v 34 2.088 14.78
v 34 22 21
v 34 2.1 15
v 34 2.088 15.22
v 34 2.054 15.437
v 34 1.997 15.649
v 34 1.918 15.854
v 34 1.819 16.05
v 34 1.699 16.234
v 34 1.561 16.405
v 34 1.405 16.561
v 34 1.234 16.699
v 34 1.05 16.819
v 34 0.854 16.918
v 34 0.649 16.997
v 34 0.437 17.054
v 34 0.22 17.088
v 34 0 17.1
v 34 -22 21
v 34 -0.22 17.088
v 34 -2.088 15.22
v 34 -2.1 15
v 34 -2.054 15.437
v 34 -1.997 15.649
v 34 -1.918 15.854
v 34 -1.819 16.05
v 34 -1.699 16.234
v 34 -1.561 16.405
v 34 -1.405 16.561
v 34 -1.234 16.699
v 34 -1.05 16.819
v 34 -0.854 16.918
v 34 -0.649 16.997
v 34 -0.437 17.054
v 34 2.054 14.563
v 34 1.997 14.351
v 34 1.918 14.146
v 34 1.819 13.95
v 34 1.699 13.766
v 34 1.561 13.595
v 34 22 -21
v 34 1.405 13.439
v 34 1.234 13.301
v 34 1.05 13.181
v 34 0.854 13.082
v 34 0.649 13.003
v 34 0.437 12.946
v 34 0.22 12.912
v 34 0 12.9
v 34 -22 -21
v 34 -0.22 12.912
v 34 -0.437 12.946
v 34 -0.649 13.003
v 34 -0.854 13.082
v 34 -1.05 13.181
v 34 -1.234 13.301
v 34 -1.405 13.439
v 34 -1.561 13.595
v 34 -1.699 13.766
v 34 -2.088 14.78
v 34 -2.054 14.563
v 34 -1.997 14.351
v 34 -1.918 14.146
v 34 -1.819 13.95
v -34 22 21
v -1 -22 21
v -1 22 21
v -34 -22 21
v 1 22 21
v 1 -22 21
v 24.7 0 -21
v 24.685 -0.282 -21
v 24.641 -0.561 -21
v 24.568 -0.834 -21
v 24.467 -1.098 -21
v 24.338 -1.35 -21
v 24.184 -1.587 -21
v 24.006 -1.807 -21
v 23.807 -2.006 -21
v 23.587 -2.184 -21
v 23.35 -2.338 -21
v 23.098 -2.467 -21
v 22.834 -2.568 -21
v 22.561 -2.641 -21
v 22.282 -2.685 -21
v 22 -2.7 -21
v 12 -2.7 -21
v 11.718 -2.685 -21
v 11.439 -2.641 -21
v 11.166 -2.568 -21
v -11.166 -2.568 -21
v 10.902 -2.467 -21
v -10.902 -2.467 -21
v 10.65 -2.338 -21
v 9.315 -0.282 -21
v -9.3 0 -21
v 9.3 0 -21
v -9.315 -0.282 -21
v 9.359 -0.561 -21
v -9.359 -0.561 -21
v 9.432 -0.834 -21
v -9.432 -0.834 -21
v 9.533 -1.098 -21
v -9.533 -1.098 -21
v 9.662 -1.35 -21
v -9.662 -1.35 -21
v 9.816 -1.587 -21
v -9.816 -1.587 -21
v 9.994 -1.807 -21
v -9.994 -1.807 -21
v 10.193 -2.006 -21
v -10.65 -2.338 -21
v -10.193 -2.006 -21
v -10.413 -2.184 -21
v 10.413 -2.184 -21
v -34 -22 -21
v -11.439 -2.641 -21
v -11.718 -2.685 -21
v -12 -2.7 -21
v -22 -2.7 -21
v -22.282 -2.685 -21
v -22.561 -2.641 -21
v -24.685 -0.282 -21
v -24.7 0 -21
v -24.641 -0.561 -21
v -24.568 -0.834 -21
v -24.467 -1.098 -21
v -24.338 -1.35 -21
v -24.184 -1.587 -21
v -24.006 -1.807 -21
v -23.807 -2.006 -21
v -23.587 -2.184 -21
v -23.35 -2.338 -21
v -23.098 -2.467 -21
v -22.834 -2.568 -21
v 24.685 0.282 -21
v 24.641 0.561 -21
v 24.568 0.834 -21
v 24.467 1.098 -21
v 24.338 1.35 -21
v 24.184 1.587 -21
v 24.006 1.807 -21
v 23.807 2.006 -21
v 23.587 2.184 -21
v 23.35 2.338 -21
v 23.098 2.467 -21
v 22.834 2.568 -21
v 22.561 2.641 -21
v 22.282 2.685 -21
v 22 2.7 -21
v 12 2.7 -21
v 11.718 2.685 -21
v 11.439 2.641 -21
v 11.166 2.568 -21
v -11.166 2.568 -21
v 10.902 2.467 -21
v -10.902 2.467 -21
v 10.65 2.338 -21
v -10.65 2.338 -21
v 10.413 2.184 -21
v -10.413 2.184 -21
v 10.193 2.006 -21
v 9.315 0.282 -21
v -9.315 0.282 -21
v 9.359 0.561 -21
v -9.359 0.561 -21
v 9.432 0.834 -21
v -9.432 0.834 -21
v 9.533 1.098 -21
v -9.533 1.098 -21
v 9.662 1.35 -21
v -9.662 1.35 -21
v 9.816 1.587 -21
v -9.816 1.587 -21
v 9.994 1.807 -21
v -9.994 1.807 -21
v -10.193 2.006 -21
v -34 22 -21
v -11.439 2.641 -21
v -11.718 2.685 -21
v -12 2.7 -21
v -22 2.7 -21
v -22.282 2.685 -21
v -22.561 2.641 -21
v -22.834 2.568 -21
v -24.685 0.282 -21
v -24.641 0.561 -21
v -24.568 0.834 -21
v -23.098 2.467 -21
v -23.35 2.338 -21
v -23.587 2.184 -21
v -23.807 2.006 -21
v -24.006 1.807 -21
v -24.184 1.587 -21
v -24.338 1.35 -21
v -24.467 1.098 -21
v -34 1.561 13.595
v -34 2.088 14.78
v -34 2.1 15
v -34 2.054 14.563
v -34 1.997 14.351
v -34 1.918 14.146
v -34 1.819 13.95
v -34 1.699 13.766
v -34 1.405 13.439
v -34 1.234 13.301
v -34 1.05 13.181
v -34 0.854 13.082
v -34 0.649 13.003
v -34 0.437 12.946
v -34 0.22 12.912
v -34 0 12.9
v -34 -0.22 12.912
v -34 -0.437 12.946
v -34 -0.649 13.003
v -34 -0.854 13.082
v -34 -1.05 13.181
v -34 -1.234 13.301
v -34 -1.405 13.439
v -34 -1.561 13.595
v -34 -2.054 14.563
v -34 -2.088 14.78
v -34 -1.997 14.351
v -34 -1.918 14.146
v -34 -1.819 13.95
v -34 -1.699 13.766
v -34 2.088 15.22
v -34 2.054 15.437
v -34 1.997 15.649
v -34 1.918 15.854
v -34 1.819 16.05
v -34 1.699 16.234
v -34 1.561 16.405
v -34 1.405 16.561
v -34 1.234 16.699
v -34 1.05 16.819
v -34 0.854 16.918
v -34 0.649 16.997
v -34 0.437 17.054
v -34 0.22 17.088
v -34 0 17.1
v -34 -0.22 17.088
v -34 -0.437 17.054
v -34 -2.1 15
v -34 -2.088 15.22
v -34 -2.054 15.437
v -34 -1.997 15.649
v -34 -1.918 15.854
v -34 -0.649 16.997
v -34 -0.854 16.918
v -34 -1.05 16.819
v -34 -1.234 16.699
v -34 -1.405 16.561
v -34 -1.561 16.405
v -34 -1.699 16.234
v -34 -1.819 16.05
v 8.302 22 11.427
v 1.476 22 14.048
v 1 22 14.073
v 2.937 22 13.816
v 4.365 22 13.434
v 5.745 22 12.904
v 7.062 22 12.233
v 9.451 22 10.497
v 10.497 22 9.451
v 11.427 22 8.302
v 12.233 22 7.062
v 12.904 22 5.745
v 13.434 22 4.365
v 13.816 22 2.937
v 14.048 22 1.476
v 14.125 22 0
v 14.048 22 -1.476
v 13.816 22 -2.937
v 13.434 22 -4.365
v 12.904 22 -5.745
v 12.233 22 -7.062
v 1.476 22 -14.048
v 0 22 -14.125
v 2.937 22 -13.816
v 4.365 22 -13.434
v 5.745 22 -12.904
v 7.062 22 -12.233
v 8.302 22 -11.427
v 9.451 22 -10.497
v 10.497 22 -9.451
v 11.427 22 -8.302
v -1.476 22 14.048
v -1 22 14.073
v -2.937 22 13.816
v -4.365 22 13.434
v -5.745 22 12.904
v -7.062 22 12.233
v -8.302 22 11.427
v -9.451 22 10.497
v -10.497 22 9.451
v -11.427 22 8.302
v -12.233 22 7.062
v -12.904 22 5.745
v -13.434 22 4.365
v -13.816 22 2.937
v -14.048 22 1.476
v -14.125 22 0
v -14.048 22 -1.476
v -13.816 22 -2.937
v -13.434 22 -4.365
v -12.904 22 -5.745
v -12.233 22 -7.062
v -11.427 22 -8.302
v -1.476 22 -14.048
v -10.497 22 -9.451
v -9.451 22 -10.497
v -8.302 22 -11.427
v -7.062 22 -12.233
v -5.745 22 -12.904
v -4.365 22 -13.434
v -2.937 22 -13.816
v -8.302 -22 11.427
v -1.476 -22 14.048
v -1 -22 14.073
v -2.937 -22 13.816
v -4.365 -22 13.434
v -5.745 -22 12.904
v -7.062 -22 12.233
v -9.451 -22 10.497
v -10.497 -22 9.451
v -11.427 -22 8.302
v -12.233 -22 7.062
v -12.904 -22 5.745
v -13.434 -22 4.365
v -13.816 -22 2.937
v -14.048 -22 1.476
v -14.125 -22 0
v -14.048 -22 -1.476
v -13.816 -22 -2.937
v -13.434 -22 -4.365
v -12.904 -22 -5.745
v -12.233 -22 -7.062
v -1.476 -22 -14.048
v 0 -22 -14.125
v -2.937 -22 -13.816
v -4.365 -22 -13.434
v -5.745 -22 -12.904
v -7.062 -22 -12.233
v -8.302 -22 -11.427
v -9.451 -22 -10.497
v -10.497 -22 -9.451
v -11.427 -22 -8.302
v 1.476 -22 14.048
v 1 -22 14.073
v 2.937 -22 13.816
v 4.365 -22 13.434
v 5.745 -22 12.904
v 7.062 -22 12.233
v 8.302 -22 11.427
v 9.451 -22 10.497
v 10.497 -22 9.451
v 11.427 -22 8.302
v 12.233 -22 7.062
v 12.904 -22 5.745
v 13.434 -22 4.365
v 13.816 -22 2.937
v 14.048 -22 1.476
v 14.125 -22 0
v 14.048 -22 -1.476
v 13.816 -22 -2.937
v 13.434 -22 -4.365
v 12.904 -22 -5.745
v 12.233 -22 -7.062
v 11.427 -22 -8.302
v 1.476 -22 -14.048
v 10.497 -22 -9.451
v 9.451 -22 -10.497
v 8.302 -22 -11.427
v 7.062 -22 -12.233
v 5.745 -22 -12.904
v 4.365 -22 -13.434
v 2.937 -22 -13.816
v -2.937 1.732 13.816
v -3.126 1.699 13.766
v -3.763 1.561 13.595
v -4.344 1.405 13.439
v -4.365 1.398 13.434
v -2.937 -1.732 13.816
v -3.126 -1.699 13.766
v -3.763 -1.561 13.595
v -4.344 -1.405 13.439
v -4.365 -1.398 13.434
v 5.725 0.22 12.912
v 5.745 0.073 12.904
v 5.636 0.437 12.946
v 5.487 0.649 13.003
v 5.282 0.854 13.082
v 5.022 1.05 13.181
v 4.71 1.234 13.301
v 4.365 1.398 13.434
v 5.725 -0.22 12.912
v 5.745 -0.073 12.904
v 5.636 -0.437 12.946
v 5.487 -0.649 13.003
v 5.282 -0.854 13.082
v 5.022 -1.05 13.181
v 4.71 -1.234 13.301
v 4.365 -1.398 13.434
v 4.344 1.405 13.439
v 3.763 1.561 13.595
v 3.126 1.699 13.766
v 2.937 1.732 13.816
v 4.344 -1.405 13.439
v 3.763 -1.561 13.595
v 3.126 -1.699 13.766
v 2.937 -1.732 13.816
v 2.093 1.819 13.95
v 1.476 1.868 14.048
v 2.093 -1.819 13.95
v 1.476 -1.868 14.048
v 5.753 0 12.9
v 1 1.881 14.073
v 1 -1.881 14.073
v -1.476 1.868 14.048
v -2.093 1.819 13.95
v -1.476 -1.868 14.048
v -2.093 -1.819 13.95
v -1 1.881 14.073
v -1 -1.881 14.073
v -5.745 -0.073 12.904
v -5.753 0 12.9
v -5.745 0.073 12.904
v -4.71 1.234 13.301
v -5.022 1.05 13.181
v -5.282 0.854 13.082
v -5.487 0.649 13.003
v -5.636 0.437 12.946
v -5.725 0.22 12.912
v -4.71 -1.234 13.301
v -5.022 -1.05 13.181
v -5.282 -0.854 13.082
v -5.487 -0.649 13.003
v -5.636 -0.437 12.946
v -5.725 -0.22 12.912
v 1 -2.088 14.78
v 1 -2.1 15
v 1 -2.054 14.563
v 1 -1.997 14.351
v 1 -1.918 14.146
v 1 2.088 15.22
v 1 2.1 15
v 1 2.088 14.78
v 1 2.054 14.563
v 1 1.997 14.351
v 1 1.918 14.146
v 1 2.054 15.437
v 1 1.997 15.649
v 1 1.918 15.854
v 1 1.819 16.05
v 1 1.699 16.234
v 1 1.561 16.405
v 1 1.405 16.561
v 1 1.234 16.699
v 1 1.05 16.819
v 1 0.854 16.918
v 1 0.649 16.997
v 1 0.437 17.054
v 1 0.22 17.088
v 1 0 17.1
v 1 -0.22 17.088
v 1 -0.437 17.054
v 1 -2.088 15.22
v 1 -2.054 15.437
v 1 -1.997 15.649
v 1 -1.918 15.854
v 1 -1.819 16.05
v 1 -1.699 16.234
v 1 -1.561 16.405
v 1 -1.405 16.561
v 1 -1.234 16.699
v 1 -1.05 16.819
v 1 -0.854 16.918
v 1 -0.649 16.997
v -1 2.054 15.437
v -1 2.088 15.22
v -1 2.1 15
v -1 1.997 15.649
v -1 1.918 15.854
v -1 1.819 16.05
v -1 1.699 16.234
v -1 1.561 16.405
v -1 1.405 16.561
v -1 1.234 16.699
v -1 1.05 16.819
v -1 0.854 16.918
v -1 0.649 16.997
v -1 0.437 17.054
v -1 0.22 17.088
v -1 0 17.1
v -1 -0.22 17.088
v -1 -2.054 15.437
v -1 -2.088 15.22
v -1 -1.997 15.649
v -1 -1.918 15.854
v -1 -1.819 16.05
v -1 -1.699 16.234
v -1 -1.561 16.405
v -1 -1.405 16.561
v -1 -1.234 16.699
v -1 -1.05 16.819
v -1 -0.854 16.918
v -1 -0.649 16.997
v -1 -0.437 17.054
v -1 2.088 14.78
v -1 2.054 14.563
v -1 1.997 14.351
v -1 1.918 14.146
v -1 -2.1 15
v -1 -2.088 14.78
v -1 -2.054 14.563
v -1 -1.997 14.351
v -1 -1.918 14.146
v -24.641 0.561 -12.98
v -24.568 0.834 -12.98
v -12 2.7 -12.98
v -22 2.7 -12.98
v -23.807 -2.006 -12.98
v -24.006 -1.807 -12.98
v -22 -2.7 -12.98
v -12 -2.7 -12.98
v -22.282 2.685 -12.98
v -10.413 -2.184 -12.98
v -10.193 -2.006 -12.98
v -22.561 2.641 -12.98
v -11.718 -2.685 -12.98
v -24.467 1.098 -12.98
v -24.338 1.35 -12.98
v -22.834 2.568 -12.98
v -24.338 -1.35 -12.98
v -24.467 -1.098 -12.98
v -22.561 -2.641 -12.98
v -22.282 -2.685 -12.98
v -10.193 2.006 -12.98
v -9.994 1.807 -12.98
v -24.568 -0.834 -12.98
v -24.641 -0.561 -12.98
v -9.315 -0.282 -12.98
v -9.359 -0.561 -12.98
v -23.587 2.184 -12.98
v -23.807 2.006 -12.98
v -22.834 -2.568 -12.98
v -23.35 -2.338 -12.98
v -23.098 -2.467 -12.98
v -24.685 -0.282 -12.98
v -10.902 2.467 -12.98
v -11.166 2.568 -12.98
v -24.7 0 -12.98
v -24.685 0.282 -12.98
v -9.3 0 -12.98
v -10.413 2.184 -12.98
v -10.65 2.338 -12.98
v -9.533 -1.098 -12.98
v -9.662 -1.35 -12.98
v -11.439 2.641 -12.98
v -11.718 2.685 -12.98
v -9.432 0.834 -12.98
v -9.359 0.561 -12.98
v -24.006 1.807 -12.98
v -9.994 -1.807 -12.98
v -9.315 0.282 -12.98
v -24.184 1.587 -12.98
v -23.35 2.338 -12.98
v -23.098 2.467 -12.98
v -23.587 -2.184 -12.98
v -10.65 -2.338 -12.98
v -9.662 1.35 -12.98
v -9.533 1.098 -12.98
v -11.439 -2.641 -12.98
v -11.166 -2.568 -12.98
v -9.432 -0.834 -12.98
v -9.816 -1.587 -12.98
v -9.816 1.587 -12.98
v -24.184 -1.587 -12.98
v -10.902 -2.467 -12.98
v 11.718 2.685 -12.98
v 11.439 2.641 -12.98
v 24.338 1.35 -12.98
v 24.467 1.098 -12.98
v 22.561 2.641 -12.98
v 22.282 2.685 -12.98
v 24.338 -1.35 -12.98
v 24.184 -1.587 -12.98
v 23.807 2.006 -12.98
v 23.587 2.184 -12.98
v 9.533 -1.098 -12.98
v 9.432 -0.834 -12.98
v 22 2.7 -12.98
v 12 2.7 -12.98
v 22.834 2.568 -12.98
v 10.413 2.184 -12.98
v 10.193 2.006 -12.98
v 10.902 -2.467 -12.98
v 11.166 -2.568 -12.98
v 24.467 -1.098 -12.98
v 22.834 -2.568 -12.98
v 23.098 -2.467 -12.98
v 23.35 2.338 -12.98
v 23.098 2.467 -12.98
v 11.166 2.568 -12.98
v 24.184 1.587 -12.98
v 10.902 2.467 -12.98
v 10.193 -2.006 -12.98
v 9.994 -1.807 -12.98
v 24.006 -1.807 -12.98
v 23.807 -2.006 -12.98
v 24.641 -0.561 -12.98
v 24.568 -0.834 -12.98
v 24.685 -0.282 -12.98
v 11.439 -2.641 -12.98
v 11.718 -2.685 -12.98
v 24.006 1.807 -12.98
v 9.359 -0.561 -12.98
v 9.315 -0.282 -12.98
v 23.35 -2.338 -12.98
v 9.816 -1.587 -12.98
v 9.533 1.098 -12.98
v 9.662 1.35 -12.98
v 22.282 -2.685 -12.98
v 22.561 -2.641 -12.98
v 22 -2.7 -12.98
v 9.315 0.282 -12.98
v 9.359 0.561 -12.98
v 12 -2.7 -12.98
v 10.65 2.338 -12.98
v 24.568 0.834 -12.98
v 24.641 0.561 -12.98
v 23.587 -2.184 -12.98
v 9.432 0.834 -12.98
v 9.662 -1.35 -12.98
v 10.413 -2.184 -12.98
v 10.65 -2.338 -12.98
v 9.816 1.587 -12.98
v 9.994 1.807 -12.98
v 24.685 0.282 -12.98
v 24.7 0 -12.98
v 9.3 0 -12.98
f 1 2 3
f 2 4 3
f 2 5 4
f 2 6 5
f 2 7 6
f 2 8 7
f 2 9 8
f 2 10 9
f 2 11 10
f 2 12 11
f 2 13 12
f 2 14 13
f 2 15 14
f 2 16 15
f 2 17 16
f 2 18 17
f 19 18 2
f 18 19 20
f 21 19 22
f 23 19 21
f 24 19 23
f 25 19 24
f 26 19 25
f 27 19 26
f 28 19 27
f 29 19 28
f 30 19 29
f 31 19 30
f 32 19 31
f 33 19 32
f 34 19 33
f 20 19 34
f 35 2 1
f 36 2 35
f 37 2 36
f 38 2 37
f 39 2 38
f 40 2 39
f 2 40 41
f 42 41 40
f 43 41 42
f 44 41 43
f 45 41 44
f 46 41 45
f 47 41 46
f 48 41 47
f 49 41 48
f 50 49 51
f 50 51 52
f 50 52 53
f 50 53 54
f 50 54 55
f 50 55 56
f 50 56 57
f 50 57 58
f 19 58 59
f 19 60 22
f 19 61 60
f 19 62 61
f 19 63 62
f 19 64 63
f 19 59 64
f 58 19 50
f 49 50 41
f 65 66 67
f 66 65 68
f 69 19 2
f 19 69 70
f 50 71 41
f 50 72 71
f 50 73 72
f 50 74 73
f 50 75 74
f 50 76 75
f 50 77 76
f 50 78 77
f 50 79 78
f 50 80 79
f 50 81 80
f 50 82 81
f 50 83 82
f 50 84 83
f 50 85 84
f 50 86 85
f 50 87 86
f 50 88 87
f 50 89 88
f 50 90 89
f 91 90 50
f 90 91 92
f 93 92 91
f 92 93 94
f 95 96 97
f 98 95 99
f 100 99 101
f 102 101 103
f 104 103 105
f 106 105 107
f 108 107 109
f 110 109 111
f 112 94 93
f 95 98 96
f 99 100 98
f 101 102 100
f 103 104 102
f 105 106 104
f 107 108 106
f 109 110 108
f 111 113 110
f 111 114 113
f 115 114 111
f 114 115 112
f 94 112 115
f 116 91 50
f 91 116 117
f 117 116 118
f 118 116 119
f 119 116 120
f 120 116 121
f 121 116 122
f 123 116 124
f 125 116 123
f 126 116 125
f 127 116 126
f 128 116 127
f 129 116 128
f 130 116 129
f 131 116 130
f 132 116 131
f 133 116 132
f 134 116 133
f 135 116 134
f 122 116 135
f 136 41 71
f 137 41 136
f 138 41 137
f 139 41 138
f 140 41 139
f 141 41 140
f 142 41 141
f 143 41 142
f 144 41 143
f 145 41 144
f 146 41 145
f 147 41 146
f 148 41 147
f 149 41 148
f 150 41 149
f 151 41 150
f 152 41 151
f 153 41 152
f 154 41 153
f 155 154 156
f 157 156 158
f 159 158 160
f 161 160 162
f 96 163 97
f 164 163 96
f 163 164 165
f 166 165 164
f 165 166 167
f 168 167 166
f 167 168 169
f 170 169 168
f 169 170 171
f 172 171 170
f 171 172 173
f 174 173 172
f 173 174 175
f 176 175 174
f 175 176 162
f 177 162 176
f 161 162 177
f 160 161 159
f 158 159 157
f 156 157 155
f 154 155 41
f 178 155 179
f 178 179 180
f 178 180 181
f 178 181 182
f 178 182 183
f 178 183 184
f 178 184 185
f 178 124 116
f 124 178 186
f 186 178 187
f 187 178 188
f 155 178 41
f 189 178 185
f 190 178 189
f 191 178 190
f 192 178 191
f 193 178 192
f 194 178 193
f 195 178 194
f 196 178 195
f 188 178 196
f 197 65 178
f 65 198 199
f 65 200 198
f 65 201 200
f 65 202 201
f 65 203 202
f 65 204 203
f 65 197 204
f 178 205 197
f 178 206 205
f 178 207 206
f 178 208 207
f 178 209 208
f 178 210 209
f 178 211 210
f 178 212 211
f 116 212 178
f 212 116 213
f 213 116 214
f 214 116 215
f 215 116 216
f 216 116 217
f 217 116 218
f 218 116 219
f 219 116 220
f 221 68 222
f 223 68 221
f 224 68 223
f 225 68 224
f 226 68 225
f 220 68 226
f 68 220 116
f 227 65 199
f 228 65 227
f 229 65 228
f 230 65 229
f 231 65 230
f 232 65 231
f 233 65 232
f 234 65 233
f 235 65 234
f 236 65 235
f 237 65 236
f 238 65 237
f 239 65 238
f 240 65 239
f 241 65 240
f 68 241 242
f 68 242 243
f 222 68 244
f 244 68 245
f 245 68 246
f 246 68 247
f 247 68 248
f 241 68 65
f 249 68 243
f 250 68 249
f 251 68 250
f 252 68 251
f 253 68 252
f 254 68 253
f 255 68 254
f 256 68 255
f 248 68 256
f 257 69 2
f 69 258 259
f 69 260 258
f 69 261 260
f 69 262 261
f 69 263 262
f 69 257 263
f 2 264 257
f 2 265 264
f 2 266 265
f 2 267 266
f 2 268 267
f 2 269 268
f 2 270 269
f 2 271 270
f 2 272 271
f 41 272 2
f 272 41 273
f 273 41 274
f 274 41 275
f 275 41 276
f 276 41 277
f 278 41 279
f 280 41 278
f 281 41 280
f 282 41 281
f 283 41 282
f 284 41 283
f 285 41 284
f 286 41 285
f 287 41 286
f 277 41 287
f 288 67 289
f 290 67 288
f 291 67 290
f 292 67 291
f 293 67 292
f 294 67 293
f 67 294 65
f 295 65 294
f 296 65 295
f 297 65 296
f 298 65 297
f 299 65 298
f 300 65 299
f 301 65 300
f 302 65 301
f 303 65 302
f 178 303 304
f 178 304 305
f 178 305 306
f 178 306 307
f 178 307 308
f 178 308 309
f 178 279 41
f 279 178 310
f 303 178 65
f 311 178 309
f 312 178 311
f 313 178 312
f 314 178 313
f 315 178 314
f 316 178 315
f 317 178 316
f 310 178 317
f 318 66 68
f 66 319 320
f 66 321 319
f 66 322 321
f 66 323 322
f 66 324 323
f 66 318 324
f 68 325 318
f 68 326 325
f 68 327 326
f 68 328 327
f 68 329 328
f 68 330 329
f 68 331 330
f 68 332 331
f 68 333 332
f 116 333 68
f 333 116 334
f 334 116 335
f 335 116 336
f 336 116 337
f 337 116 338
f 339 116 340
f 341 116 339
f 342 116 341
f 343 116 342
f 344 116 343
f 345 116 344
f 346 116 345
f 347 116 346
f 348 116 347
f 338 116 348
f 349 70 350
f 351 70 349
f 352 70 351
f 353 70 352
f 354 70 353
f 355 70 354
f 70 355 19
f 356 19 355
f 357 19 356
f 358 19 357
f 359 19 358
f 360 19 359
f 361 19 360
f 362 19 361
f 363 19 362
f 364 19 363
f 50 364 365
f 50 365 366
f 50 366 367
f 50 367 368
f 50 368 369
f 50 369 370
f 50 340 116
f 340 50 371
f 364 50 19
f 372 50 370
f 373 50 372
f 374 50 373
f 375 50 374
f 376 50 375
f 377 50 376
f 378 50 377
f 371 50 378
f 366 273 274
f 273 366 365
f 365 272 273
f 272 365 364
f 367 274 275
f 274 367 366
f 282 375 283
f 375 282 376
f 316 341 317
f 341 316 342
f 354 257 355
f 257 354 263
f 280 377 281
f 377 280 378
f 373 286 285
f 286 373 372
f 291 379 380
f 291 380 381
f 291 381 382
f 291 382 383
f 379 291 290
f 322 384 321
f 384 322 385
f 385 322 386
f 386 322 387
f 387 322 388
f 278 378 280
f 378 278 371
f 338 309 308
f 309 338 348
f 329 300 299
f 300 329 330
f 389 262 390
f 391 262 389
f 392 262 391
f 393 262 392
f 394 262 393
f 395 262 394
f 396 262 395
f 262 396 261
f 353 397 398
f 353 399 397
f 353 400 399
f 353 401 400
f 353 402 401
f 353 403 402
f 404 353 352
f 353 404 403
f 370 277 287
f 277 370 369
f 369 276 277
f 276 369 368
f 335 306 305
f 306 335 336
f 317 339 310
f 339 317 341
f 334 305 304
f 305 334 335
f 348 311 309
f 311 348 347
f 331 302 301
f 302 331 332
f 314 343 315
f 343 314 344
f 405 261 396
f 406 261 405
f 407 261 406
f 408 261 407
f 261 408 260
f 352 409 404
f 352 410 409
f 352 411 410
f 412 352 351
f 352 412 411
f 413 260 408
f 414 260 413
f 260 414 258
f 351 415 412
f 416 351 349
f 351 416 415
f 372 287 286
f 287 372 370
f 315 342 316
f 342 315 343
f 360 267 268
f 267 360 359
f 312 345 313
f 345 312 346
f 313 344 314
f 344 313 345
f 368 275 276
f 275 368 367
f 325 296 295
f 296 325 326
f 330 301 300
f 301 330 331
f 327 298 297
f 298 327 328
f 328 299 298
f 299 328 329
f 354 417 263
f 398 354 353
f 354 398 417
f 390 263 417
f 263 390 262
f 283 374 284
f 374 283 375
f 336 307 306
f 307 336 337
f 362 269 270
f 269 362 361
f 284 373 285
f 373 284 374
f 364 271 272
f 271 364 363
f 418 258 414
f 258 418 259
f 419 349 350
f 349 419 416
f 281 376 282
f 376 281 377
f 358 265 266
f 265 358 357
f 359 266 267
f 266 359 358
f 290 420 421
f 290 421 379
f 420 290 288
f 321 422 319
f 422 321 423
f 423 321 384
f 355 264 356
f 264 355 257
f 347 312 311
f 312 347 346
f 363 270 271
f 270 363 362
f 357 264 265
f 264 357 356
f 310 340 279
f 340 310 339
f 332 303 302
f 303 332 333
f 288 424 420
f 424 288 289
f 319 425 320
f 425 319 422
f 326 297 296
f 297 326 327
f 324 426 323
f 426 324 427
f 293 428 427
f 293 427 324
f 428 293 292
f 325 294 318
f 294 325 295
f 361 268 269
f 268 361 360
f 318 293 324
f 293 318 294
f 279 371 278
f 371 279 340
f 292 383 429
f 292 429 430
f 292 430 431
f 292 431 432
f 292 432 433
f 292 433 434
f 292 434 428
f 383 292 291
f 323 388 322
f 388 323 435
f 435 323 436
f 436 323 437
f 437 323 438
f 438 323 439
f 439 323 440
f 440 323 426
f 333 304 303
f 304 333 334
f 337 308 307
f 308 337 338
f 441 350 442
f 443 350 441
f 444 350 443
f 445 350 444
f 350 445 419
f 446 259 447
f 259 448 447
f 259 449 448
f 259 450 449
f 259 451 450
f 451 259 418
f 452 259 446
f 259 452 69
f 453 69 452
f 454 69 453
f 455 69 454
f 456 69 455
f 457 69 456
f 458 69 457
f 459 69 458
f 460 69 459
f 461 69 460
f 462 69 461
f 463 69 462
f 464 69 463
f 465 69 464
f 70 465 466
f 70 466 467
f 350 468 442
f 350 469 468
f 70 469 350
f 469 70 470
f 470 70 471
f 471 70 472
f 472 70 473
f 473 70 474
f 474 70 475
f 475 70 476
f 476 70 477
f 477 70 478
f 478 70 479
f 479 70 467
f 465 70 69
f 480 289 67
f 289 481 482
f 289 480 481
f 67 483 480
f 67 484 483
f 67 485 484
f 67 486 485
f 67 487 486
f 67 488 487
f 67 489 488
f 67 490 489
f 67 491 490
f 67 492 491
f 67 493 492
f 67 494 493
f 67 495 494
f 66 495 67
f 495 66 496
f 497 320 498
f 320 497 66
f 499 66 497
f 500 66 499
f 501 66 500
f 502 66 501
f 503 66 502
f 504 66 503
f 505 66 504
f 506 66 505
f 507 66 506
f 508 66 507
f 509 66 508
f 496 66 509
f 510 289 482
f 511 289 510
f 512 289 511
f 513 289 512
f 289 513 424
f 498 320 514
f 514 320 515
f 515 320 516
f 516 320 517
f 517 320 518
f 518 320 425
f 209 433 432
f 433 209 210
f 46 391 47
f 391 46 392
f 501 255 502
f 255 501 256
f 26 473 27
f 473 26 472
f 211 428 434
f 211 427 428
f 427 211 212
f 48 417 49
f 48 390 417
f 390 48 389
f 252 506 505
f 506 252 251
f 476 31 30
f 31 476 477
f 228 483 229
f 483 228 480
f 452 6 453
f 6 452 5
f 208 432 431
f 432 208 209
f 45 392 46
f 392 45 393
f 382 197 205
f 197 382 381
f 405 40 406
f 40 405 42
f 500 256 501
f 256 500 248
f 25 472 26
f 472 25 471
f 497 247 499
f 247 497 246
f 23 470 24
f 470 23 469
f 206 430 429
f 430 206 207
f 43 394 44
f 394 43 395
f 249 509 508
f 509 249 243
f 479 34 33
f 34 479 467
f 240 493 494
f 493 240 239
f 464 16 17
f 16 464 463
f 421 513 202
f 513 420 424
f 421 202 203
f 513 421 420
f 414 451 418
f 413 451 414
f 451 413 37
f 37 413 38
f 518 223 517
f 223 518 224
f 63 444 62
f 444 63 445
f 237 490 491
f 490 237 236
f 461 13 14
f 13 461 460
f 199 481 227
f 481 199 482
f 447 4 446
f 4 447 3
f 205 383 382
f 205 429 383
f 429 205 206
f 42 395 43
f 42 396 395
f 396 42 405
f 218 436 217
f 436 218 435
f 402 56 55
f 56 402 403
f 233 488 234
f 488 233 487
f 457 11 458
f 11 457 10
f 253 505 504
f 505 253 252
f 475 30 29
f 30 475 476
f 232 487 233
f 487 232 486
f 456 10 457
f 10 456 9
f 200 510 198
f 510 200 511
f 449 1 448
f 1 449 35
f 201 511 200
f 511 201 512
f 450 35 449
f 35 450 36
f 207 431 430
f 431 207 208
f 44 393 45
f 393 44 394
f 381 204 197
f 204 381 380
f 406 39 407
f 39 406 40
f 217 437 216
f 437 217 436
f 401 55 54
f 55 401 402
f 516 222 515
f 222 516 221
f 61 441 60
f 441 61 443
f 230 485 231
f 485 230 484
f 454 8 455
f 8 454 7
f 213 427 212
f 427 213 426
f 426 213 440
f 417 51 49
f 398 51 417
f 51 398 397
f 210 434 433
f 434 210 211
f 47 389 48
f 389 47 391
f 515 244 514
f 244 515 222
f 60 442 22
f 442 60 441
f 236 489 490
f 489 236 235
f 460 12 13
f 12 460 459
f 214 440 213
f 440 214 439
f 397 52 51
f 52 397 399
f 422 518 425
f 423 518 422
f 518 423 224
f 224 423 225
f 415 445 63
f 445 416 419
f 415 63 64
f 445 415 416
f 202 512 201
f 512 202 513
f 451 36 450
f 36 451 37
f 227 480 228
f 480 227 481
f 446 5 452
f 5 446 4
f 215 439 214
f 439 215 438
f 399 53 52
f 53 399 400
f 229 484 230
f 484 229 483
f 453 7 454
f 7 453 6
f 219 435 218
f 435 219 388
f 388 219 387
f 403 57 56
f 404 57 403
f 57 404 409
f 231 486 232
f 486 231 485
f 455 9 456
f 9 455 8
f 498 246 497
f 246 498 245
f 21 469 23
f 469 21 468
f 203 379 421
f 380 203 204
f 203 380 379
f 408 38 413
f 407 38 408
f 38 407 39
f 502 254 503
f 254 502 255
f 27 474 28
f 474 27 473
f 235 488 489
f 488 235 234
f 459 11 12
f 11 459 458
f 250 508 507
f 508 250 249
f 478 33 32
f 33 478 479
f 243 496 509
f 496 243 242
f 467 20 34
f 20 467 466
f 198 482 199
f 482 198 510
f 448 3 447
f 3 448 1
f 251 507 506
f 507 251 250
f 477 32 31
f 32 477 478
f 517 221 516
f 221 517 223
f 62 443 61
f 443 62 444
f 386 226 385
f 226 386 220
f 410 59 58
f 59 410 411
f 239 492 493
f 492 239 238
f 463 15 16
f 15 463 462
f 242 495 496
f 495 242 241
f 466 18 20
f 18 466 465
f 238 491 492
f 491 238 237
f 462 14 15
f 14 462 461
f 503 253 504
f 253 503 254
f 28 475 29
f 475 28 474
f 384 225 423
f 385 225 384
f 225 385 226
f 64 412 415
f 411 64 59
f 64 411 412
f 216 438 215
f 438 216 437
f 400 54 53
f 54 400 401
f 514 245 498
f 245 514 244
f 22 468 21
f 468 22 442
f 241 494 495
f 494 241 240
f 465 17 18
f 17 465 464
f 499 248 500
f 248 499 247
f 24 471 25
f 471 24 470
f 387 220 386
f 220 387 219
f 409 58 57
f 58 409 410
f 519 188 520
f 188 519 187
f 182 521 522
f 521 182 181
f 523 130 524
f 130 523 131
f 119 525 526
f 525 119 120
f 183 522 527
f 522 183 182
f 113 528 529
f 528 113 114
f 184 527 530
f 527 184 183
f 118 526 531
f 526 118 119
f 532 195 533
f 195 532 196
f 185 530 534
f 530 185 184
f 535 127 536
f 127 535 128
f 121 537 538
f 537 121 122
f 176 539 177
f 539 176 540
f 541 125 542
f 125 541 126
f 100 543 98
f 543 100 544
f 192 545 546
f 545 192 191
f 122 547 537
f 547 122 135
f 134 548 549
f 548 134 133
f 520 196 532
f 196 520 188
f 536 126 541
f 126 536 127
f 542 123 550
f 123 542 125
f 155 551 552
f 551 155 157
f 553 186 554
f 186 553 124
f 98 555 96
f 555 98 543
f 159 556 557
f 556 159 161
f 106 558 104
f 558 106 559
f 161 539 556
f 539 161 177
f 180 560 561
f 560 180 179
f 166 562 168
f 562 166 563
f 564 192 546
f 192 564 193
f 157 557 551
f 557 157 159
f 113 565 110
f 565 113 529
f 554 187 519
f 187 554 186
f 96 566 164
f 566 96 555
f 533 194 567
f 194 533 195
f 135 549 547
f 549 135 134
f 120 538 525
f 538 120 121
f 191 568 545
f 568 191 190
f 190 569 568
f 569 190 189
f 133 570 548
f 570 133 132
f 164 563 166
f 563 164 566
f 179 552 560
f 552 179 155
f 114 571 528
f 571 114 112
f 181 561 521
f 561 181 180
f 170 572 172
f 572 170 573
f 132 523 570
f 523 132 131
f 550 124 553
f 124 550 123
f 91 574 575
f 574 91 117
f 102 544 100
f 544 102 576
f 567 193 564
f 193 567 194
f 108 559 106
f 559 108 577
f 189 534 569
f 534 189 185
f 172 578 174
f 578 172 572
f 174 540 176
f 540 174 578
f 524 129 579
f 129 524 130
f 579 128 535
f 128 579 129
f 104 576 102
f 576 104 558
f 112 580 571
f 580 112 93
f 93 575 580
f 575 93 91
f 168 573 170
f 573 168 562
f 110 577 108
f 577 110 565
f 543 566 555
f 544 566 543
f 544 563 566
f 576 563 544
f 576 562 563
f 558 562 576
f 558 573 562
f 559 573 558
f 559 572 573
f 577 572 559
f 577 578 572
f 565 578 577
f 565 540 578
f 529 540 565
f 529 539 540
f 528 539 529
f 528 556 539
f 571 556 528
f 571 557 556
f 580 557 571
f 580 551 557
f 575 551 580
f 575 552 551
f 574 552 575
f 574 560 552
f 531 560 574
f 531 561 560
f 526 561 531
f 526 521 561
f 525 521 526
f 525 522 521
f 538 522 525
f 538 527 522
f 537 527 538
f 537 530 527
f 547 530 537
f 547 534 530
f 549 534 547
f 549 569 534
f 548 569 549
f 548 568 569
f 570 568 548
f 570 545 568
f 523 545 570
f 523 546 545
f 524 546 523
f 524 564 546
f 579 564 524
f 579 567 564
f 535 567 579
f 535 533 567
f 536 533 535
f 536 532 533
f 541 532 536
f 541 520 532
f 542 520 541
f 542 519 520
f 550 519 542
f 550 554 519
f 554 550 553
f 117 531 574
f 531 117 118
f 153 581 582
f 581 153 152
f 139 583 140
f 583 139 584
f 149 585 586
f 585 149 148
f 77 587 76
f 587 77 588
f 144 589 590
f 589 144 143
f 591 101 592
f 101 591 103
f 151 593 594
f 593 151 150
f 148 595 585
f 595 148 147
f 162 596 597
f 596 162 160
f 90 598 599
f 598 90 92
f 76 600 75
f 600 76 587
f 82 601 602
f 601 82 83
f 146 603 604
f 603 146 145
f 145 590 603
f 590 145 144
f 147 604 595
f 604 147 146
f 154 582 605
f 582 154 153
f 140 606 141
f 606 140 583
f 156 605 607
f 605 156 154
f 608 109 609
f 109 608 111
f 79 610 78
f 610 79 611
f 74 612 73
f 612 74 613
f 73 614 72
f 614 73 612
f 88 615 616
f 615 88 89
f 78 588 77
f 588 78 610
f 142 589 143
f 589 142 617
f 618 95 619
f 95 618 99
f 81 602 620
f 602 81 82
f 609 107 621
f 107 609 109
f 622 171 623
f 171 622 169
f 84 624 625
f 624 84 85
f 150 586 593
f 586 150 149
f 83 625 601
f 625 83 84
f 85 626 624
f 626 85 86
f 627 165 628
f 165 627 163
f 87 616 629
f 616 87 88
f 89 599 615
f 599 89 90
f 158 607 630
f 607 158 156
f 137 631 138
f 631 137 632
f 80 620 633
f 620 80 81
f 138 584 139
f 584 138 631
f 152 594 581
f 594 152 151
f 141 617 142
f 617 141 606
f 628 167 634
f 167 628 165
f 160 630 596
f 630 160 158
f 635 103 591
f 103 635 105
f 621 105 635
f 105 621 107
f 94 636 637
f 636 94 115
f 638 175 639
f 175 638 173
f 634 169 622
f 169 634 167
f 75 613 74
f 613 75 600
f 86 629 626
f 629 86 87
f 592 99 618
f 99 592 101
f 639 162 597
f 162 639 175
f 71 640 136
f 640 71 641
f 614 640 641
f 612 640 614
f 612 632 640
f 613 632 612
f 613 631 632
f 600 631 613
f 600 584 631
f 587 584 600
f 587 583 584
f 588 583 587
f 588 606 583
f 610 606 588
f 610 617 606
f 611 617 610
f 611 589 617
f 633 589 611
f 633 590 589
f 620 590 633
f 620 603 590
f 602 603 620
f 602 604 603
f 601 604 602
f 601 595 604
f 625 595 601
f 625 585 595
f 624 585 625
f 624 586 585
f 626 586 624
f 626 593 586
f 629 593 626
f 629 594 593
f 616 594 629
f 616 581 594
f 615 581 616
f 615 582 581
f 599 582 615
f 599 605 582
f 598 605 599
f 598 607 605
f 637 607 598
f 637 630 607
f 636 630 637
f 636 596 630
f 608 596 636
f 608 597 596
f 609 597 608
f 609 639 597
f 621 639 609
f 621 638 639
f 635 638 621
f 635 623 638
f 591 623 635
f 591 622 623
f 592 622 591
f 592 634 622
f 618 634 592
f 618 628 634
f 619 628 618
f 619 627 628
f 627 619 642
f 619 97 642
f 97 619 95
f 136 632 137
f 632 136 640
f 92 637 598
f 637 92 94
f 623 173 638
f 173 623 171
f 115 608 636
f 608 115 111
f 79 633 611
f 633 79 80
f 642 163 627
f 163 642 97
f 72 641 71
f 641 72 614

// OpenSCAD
// Split housing for 28 mm OD linear bearing.
$fn = 60;
eps = 0.02;
bearing_d = 28;
body_l = 68;
body_d = 44;
body_h = 42;
slot_w = 2;
module mount_slot(x) {
    hull() {
        translate([x - 5, 0, -body_h / 2 - eps]) cylinder(d = 5.4, h = 8 + 2 * eps);
        translate([x + 5, 0, -body_h / 2 - eps]) cylinder(d = 5.4, h = 8 + 2 * eps);
    }
}
difference() {
    cube([body_l, body_d, body_h], center = true);
    translate([0, -body_d / 2 - eps, 0]) rotate([-90, 0, 0]) cylinder(d = bearing_d + 0.25, h = body_d + 2 * eps);
    translate([-slot_w / 2, -body_d / 2 - eps, 0]) cube([slot_w, body_d + 2 * eps, body_h / 2 + eps]);
    translate([-body_l / 2 - eps, 0, body_h / 2 - 6]) rotate([0, 90, 0]) cylinder(d = 4.2, h = body_l + 2 * eps);
    mount_slot(-body_l / 4);
    mount_slot(body_l / 4);
}
